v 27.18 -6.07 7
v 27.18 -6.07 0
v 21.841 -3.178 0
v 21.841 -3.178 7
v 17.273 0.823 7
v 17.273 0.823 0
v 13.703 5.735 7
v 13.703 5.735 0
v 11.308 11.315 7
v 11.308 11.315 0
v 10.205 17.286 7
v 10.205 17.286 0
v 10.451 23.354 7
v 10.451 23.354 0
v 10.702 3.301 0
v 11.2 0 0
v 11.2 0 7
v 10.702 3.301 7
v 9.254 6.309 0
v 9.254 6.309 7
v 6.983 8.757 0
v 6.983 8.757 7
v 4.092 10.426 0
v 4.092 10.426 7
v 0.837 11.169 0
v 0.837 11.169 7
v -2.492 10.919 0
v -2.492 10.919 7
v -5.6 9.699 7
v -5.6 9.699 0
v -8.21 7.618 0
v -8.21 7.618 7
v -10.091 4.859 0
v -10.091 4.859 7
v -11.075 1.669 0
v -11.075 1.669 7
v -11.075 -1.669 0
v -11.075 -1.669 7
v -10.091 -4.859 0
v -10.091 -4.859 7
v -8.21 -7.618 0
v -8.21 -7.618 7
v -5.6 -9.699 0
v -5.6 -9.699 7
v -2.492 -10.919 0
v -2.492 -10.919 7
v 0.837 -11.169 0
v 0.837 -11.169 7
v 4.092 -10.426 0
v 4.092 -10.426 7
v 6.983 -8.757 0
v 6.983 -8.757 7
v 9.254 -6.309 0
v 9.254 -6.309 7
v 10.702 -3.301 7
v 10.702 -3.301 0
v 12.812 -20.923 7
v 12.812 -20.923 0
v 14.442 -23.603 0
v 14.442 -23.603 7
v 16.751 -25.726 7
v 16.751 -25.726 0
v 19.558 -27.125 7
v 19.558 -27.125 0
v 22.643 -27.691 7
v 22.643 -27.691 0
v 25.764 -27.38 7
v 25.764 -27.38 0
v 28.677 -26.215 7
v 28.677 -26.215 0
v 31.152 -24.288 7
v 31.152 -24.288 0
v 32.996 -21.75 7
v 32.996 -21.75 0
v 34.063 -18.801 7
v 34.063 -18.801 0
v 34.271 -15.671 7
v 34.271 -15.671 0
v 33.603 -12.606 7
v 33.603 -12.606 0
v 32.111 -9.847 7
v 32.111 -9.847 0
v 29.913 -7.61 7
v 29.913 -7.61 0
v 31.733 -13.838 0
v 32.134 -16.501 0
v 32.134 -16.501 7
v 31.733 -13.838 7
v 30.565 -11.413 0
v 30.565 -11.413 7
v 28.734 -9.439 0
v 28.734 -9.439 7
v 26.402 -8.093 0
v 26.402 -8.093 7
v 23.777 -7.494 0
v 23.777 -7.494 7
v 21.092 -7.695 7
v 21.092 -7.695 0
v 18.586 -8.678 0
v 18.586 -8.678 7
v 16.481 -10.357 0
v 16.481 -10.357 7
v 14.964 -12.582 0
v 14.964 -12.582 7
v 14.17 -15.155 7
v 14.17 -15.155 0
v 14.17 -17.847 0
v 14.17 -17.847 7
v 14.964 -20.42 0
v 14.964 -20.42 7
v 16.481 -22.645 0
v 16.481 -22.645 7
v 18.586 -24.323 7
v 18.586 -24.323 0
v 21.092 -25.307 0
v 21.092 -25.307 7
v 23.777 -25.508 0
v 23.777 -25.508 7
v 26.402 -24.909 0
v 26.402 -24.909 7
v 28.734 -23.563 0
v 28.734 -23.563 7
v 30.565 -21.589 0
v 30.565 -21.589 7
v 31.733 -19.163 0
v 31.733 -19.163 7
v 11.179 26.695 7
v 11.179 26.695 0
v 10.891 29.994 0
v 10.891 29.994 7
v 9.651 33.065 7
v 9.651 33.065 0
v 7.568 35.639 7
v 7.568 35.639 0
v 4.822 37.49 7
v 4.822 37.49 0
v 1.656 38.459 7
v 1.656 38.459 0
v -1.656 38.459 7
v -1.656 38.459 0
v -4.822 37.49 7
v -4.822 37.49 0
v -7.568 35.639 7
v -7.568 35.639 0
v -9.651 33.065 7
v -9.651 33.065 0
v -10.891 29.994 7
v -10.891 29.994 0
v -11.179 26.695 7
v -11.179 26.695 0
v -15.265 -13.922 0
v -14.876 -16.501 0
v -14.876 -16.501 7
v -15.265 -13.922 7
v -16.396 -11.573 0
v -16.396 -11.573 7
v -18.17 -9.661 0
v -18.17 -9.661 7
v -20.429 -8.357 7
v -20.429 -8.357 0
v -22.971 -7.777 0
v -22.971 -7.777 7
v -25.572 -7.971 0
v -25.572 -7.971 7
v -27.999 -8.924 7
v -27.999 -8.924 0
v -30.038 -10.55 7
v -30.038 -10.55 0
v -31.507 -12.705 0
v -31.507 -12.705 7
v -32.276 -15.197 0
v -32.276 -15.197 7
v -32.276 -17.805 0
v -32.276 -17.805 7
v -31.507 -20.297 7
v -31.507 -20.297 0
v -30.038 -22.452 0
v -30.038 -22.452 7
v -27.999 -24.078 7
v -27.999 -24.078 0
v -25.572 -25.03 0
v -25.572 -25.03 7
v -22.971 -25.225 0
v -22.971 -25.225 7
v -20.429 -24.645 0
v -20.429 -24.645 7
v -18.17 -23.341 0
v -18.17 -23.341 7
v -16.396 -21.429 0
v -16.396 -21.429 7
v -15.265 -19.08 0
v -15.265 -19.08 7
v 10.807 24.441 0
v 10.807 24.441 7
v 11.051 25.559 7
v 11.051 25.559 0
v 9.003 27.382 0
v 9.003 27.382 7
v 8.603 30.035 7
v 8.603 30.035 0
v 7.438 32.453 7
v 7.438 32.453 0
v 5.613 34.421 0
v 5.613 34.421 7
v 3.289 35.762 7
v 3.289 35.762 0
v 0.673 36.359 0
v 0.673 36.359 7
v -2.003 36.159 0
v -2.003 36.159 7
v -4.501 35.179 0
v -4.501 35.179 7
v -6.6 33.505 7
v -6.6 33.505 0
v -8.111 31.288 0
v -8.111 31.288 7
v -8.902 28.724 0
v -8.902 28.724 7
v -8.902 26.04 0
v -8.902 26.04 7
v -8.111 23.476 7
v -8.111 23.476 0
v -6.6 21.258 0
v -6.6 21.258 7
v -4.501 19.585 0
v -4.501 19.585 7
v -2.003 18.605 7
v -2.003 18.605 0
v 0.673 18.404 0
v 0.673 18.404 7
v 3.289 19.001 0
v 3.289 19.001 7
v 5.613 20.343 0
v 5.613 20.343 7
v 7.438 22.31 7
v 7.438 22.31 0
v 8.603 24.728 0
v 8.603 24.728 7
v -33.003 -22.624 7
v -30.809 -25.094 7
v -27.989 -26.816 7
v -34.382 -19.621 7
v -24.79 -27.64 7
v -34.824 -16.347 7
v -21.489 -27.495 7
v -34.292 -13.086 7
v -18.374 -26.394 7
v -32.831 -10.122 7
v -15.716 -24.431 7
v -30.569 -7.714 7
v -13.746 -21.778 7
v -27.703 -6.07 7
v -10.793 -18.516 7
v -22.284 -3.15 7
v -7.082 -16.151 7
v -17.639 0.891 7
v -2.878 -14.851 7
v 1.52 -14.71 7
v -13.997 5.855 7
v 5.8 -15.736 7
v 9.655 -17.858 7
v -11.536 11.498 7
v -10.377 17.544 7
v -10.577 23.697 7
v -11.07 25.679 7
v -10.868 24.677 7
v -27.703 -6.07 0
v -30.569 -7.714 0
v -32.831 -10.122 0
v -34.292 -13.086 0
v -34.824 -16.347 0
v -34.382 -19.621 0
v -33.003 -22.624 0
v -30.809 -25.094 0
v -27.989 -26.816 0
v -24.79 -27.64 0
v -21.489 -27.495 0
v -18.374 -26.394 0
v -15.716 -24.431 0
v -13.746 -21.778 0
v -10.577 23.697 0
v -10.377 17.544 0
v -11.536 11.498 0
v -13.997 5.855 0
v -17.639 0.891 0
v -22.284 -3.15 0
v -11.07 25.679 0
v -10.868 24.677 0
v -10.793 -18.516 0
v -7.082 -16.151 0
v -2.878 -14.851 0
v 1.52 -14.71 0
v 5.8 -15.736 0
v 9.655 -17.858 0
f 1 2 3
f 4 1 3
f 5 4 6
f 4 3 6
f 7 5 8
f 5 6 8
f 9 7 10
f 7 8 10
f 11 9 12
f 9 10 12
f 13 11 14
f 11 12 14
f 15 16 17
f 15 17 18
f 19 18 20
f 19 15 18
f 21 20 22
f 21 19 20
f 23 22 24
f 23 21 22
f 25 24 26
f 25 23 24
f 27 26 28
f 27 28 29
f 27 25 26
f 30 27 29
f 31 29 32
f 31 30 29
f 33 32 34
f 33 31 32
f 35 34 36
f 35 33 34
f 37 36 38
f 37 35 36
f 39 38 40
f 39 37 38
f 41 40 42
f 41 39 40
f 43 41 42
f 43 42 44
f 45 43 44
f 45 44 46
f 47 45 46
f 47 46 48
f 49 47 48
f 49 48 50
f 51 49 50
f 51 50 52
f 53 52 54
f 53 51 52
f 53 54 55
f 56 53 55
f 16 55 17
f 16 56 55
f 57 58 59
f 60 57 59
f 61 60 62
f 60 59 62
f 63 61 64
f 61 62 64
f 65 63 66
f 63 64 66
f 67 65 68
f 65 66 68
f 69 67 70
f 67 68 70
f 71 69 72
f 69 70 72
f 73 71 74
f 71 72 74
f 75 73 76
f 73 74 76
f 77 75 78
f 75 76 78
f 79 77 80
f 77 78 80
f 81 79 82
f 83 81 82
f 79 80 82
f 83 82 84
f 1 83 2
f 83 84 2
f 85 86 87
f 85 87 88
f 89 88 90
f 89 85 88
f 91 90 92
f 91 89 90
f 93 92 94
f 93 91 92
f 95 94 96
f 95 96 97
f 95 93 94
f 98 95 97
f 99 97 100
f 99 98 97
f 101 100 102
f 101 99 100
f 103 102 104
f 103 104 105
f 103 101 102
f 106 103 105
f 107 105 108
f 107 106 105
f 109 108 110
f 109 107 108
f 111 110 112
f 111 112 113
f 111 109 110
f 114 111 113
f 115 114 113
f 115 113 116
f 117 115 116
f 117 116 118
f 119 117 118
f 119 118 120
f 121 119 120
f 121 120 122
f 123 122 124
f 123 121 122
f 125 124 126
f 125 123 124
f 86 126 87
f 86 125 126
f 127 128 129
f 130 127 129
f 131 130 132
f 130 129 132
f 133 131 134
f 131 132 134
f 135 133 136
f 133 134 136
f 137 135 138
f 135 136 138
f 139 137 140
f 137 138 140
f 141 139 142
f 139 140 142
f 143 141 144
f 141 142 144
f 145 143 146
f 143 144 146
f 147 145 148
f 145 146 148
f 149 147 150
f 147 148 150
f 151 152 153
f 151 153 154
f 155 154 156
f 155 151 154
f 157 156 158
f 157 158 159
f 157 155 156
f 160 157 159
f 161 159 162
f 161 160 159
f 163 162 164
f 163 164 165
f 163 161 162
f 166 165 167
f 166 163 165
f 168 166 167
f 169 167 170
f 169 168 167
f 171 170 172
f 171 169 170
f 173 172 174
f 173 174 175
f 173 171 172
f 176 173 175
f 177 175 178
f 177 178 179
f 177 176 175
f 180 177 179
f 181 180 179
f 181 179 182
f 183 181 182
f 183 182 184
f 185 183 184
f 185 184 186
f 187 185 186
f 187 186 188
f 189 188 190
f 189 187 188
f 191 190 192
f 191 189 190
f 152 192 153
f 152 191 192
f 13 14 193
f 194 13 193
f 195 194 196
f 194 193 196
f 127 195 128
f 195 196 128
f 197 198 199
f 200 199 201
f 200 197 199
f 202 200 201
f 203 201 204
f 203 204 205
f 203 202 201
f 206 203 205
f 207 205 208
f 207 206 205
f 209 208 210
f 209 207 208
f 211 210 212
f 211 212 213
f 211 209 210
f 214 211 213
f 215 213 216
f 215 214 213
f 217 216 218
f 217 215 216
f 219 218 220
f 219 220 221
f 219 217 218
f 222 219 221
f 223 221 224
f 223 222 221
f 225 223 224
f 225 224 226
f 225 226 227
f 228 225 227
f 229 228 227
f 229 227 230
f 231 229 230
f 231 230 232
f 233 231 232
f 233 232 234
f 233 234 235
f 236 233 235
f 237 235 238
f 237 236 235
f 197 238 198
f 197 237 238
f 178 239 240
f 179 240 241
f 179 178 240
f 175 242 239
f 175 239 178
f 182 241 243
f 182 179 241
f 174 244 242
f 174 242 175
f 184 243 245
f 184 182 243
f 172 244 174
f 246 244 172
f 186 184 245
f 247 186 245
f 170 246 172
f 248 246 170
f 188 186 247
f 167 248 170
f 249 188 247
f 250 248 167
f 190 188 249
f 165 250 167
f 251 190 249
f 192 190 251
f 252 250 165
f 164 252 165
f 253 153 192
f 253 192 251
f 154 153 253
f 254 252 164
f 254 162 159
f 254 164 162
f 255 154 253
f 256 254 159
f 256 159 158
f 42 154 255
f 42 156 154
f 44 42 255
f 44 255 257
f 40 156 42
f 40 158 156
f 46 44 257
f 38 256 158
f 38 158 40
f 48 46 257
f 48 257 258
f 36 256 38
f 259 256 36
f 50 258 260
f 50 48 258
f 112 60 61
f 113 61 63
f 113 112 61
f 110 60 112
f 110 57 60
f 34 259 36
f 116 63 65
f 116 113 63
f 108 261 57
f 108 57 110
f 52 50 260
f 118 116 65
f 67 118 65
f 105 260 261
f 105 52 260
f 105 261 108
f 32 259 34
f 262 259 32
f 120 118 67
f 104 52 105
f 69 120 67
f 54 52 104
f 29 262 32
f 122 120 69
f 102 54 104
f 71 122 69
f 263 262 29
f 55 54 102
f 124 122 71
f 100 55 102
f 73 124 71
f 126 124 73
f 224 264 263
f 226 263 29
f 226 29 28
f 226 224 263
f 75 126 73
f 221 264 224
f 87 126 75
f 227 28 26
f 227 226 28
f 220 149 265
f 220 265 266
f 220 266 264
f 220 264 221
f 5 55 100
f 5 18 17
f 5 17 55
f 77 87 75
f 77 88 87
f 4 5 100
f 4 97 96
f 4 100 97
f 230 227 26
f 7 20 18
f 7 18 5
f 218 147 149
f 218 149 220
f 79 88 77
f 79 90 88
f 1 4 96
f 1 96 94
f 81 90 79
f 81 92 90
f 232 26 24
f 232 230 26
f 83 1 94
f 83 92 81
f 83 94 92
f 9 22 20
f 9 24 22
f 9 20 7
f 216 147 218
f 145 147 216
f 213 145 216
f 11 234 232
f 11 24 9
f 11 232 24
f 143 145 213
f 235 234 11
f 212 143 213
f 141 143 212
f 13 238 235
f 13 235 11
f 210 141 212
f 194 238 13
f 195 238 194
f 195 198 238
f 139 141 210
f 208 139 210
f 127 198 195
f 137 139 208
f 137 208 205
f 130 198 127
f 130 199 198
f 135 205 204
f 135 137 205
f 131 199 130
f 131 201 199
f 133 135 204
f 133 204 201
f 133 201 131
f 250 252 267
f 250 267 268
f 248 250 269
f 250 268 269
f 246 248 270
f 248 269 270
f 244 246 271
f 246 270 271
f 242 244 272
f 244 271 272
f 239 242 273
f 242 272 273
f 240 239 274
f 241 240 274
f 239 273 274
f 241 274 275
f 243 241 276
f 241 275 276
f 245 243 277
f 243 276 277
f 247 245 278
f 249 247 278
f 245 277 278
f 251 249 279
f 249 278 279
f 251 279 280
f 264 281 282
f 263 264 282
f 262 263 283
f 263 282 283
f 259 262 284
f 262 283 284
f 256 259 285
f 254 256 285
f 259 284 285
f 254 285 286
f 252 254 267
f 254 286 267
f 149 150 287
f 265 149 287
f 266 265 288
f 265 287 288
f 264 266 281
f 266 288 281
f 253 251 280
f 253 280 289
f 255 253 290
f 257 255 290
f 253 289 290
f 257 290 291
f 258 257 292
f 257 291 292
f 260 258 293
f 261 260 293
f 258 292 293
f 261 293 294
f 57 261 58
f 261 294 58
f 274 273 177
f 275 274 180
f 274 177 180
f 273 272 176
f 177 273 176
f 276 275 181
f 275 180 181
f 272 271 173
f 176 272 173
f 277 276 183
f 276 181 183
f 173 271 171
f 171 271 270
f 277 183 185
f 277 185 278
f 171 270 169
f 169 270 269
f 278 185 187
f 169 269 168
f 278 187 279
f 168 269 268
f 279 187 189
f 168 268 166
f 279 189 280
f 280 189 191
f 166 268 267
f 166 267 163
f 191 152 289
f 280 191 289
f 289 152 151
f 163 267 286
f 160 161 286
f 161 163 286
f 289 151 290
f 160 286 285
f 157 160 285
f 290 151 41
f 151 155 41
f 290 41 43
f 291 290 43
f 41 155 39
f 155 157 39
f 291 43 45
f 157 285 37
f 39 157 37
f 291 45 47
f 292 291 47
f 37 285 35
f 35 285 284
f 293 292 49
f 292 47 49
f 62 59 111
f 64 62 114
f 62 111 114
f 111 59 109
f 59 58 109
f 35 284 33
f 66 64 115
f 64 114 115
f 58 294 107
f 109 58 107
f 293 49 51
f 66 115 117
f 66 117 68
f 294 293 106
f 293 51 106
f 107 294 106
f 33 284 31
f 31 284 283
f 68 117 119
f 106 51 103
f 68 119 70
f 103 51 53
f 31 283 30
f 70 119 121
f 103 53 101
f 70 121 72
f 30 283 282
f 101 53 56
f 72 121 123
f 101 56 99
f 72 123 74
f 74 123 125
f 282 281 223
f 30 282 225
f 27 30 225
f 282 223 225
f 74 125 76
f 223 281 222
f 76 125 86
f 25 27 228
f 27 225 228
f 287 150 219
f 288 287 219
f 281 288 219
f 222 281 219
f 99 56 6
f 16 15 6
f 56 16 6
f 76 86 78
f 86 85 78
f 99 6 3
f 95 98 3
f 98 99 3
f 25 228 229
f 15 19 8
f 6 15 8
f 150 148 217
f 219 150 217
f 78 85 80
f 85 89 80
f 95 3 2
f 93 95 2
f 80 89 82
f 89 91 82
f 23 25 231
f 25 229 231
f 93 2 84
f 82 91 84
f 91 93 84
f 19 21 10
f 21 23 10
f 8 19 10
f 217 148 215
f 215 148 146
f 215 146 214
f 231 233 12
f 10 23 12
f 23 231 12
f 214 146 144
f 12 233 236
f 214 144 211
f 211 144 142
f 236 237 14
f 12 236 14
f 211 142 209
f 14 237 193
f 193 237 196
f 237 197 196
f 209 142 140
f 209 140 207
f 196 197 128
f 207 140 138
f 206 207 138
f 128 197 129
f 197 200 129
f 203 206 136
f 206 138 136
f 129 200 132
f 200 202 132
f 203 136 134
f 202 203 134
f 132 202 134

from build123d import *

# Parameters (mm, degrees)
F0_R     = 8.748743
F0_R_2   = 9.032553
F0_R_3   = 11.2
F0_R_4   = 9.0028
F1_DEPTH = 7


with BuildPart() as f1:
    # F0 (on Top) → F1 (new body)
    with BuildSketch(Plane.XY):
        with BuildLine():
            ThreePointArc((11.178943, 26.695394), (10.762369, 25.036023), (10.45059, 23.353811))
            ThreePointArc((10.45059, 23.353811), (10.943067, 24.996637), (11.178943, 26.695394))
        make_face()
        with BuildLine():
            ThreePointArc((-10.576557, 23.697235), (-10.836514, 25.204599), (-11.178943, 26.695394))
            ThreePointArc((-11.178943, 26.695394), (-10.980559, 25.175658), (-10.576557, 23.697235))
        make_face()
        with BuildLine():
            ThreePointArc((27.180357, -6.069851), (13.702991, 5.735114), (10.45059, 23.353811))
            ThreePointArc((10.45059, 23.353811), (10.762369, 25.036023), (11.178943, 26.695394))
            ThreePointArc((11.178943, 26.695394), (0, 38.581858), (-11.178943, 26.695394))
            ThreePointArc((-11.178943, 26.695394), (-10.836514, 25.204599), (-10.576557, 23.697235))
            ThreePointArc((-10.576557, 23.697235), (-13.997206, 5.854713), (-27.703453, -6.069851))
            ThreePointArc((-27.703453, -6.069851), (-31.997535, -23.940002), (-13.746279, -21.778267))
            ThreePointArc((-13.746279, -21.778267), (-0.683408, -14.633163), (12.811986, -20.923272))
            ThreePointArc((12.811986, -20.923272), (31.151847, -24.287939), (27.180357, -6.069851))
        make_face()
        with Locations((-23.624999, -16.500873)):
            Circle(F0_R, mode=Mode.SUBTRACT)
        with Locations((23.101903, -16.500873)):
            Circle(F0_R_2, mode=Mode.SUBTRACT)
        Circle(F0_R_3, mode=Mode.SUBTRACT)
        with Locations((0, 27.381858)):
            Circle(F0_R_4, mode=Mode.SUBTRACT)
    extrude(amount=F1_DEPTH)


solid = f1.part
